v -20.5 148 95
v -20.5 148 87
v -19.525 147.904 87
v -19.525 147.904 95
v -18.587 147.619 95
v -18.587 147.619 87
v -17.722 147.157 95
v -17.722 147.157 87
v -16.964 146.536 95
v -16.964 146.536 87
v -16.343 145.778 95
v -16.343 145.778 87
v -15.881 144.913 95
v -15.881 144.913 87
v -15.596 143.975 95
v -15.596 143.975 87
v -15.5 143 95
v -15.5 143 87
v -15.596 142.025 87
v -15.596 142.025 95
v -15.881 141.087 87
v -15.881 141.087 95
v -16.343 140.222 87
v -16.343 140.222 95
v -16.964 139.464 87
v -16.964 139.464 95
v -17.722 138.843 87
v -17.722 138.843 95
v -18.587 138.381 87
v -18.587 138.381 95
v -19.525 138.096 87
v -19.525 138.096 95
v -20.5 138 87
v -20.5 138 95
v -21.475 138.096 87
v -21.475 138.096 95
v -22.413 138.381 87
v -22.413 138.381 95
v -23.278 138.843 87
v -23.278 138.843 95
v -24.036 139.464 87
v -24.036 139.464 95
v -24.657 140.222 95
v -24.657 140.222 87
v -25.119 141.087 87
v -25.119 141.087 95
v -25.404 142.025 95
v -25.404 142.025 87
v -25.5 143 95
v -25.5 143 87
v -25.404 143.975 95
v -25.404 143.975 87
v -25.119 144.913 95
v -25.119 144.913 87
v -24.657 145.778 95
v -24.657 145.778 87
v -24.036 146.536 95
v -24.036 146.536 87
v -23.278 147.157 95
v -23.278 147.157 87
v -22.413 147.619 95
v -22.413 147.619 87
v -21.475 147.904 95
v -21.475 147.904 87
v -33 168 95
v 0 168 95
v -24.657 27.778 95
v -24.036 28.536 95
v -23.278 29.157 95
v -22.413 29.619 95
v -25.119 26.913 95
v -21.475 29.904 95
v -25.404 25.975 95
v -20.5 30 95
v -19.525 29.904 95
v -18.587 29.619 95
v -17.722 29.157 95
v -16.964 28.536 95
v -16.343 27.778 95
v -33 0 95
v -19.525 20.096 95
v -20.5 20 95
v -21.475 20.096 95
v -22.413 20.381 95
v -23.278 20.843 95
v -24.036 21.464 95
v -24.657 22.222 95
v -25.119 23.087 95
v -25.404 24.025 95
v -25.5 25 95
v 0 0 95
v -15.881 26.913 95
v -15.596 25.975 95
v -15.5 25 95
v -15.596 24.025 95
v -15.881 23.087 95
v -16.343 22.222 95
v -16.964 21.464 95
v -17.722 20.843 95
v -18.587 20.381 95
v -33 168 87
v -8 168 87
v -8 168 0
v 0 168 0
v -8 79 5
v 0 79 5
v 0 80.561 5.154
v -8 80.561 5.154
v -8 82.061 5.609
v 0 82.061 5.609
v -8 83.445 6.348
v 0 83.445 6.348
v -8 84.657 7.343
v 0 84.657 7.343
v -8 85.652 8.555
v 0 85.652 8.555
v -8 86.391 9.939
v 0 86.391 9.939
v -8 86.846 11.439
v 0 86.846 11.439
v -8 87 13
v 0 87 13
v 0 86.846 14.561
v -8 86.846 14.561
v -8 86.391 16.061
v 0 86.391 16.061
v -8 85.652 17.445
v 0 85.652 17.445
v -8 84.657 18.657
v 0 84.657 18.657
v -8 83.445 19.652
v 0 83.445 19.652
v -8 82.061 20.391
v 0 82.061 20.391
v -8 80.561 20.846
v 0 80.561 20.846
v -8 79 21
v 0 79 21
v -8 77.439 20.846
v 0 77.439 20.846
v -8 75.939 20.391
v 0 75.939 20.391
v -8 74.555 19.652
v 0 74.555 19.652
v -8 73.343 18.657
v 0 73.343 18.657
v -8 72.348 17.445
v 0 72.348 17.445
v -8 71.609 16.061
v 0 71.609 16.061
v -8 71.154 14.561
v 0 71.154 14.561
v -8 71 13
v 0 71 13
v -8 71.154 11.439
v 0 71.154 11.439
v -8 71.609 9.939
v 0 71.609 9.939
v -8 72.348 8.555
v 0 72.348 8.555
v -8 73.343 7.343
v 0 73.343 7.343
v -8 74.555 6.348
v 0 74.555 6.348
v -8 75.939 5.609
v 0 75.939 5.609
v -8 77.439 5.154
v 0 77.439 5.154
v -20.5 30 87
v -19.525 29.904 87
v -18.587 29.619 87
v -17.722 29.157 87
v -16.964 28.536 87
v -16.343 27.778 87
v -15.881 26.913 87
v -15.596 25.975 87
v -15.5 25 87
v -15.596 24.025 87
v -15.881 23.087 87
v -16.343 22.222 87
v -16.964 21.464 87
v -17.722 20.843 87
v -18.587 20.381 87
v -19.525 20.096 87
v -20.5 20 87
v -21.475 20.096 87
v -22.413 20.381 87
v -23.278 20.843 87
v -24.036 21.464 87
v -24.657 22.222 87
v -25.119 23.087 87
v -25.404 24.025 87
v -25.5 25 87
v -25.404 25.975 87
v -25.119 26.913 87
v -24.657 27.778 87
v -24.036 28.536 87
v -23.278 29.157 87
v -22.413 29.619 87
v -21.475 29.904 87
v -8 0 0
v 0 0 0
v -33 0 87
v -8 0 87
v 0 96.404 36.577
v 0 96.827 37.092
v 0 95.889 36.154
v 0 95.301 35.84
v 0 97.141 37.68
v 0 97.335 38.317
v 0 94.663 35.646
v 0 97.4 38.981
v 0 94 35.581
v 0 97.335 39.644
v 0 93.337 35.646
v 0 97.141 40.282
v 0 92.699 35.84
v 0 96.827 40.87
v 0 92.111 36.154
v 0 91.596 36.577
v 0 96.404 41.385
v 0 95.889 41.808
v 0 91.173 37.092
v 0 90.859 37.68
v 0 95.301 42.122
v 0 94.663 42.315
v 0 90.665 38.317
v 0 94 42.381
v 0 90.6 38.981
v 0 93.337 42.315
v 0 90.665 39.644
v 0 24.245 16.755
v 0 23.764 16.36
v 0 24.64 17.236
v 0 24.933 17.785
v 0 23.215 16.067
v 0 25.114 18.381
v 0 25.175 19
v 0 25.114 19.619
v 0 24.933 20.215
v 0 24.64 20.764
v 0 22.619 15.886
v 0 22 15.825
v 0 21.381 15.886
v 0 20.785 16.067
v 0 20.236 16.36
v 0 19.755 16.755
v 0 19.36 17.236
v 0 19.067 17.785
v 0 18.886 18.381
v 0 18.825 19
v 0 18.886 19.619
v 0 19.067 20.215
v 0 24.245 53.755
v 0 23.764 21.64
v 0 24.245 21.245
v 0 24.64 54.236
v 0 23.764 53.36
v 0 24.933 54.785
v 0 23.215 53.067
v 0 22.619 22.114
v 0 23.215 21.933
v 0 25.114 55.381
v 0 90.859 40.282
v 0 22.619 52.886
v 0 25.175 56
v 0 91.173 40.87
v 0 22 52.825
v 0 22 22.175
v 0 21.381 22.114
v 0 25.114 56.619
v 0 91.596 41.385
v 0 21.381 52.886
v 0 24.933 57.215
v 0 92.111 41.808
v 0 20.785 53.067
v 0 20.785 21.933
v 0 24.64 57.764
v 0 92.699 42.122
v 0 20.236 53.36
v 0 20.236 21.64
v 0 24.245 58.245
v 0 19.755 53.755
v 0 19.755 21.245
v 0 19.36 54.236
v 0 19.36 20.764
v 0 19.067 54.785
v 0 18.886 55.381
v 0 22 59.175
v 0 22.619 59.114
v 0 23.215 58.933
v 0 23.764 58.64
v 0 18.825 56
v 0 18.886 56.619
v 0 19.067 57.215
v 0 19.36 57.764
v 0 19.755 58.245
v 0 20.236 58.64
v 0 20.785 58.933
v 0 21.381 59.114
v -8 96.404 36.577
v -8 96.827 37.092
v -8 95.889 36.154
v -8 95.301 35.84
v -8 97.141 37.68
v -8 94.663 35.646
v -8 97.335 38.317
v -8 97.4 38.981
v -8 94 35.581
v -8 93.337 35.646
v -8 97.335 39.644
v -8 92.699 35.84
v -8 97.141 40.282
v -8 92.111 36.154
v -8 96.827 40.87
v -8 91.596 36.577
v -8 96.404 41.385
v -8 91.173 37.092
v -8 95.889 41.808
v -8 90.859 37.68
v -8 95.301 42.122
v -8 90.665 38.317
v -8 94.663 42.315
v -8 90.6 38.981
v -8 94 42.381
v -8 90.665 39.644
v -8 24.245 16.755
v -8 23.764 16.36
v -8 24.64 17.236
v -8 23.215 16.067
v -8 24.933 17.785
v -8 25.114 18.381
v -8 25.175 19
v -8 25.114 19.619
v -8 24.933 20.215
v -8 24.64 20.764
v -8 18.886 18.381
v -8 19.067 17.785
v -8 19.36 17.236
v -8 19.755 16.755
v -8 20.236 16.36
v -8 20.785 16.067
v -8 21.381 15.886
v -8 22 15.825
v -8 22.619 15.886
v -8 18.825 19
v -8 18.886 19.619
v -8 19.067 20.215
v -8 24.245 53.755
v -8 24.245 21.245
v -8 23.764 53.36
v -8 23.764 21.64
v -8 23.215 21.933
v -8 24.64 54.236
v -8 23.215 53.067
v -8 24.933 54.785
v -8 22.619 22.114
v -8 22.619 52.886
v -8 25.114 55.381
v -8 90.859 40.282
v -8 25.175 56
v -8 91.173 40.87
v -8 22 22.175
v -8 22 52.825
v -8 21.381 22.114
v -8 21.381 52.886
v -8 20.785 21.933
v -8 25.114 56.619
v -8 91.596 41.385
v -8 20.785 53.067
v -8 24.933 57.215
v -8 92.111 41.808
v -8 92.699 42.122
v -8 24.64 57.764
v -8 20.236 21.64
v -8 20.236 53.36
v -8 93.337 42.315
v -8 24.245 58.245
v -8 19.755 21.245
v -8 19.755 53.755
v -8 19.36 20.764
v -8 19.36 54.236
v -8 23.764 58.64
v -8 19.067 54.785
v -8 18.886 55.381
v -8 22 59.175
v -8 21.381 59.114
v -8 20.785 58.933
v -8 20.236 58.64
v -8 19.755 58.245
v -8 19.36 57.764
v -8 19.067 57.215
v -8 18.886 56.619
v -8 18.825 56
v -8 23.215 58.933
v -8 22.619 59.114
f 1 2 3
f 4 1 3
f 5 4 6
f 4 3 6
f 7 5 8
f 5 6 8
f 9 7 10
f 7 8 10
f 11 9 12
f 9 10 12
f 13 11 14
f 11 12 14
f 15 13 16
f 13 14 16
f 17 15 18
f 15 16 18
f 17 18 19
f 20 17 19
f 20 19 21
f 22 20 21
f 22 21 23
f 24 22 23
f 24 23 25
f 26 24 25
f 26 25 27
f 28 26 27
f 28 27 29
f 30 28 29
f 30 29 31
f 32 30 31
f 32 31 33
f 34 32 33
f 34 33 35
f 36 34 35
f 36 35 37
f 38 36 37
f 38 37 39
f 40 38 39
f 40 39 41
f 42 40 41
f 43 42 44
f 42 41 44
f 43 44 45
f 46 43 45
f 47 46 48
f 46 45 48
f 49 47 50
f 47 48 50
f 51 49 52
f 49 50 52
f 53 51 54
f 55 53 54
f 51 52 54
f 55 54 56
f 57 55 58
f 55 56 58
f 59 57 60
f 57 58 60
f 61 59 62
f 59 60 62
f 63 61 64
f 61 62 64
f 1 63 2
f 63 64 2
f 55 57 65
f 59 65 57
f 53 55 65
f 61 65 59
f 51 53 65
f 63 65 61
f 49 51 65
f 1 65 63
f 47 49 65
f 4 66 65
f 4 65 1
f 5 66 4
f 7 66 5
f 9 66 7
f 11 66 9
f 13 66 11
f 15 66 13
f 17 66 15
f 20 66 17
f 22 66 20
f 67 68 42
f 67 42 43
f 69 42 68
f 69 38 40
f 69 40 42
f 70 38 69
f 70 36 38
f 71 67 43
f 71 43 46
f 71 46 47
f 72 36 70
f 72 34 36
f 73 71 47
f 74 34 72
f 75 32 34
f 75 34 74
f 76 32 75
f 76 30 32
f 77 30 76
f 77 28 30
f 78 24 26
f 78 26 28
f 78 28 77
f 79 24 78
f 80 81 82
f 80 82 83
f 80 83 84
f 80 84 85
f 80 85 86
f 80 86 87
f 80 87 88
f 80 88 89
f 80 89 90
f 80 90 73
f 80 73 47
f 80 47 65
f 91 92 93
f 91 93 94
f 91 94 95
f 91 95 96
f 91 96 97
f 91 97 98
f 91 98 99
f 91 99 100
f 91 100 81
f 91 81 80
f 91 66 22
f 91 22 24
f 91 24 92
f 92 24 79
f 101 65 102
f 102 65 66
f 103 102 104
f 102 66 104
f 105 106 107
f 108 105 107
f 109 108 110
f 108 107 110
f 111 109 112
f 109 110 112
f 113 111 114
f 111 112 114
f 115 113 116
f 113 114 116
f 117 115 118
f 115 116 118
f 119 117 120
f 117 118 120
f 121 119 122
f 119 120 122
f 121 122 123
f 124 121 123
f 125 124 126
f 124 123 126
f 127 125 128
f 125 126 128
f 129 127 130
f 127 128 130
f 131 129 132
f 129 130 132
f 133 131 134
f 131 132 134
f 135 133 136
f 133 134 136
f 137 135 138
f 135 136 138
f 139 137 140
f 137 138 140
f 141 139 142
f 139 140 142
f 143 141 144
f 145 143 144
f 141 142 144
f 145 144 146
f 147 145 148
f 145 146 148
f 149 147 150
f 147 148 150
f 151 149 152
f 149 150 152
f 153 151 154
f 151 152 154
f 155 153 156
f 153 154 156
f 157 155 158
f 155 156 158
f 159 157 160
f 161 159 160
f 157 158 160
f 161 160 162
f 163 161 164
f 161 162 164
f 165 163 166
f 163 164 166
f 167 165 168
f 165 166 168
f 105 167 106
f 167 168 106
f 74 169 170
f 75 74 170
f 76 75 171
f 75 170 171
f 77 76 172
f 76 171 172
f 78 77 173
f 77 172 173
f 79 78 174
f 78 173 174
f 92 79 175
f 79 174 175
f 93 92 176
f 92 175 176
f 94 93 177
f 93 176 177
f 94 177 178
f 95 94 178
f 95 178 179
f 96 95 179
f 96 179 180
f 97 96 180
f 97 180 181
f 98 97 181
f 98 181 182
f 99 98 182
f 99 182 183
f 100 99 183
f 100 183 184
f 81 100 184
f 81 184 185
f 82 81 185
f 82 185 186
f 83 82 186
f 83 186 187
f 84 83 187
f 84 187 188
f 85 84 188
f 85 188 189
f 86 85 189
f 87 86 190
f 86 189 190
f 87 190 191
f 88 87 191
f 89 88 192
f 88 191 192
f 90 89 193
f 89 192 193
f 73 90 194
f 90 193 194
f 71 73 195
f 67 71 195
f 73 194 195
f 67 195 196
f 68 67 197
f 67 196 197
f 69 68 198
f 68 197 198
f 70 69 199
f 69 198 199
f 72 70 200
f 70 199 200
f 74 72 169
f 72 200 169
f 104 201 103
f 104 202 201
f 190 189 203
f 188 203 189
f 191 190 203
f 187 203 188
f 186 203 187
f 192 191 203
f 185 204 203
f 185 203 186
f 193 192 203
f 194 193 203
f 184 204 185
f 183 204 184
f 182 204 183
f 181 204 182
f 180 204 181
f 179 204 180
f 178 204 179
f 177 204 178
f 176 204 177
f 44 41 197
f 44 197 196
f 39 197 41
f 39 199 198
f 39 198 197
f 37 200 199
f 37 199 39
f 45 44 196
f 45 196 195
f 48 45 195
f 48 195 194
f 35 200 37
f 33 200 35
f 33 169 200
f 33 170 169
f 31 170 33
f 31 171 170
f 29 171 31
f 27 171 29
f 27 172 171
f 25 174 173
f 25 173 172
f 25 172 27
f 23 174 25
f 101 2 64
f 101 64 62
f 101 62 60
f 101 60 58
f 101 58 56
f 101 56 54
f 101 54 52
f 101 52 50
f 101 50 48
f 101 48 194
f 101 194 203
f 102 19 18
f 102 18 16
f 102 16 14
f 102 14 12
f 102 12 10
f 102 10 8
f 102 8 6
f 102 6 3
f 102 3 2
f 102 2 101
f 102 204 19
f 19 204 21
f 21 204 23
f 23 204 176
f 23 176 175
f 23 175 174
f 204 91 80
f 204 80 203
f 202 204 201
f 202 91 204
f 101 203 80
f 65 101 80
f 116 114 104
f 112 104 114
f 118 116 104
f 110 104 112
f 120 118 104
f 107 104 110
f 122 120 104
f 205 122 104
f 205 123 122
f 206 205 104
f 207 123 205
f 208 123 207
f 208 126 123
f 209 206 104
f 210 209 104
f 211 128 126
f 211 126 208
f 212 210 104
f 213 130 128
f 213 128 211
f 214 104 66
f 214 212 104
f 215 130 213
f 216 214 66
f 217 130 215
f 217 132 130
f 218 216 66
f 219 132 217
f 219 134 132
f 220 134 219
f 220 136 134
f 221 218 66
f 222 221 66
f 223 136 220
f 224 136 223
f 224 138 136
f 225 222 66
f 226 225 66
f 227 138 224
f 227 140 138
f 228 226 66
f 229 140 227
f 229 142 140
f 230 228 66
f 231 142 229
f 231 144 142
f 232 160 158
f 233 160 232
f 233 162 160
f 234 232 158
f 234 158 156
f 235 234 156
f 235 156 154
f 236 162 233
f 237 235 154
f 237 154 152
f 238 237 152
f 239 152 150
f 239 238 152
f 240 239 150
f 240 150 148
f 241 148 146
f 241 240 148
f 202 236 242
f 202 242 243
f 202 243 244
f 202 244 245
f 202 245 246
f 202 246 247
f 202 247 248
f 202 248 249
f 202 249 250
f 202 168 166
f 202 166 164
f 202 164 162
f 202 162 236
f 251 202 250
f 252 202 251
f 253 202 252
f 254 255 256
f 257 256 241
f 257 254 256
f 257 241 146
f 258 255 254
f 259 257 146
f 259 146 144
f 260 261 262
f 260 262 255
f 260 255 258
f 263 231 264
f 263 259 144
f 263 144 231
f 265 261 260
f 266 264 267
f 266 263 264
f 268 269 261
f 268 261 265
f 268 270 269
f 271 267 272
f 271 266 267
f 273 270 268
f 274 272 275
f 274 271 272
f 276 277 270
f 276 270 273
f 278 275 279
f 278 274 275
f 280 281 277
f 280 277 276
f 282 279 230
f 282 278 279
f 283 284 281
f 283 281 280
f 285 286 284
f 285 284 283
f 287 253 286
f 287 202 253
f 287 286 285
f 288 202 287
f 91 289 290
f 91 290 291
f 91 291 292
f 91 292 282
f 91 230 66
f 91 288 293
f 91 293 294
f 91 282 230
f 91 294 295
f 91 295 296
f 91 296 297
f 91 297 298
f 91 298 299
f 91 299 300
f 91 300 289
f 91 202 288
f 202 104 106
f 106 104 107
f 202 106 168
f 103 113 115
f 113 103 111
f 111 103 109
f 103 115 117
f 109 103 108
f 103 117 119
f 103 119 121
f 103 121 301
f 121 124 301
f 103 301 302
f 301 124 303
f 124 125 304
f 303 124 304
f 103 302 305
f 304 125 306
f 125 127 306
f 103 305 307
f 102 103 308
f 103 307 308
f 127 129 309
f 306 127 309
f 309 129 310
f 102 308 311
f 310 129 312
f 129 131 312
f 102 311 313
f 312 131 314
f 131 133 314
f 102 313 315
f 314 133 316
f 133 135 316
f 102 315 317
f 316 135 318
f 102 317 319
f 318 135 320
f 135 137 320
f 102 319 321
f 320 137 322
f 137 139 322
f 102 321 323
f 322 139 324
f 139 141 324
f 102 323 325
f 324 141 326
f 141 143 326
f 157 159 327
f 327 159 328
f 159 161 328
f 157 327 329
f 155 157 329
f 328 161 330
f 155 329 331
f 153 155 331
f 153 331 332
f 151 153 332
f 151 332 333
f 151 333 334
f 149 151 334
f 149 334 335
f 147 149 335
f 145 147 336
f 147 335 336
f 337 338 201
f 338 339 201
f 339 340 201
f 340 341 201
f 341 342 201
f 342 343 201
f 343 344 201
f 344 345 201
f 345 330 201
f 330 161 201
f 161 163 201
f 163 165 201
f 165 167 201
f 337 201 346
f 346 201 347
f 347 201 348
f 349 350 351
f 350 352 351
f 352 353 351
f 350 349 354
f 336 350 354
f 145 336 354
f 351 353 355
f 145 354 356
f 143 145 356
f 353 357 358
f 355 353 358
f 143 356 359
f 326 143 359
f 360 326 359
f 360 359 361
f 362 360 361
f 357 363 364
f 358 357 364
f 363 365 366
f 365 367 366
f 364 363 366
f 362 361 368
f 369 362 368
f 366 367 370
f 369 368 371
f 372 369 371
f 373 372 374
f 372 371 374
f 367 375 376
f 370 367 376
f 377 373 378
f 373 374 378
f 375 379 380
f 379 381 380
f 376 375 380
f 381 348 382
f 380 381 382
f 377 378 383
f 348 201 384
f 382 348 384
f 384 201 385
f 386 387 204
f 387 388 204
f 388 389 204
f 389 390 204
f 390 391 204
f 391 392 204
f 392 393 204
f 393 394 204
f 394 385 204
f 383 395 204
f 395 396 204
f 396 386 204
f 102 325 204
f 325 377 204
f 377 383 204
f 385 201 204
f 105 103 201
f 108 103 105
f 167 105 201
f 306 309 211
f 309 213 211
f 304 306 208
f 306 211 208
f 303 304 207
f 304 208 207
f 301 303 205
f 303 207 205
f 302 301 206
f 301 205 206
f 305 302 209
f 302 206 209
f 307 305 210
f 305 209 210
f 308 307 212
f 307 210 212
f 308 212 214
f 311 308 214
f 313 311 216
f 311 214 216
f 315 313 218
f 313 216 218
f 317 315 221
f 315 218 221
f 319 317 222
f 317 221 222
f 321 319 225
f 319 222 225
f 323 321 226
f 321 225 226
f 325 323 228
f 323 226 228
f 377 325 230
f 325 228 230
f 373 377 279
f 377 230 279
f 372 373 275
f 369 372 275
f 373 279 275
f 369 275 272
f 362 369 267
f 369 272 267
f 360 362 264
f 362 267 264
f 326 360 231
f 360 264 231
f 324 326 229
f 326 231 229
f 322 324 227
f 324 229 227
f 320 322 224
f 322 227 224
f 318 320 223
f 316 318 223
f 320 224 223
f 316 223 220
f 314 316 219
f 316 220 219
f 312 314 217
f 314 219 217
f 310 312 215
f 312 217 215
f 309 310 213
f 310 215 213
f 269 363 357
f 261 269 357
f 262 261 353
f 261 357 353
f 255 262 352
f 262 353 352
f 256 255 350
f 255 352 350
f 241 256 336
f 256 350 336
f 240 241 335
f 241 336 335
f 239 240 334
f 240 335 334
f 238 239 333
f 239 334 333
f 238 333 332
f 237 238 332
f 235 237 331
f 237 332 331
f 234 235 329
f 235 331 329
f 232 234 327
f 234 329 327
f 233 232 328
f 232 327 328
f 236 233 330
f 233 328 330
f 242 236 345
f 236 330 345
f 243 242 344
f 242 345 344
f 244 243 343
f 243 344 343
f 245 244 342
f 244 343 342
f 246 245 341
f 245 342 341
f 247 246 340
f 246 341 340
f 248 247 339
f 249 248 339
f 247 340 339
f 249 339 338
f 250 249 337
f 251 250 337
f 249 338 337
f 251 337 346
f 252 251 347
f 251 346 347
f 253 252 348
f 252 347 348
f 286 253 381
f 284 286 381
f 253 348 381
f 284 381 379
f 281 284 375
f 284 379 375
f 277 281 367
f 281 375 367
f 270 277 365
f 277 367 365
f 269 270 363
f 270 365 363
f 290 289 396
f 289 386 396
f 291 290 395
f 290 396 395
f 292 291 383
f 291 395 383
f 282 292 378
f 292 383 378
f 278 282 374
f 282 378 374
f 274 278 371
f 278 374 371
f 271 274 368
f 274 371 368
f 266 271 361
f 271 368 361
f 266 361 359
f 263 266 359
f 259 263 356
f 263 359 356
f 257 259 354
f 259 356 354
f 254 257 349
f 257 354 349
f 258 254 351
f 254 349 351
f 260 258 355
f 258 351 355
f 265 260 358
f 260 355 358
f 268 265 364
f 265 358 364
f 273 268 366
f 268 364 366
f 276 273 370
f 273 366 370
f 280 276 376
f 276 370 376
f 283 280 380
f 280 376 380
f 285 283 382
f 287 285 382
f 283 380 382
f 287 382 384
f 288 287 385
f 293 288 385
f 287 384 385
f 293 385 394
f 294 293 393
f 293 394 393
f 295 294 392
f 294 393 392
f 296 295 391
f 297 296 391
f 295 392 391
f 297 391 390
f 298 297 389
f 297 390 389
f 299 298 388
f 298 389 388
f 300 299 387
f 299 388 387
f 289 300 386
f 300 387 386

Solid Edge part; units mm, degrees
sketch "Sketch1" plane through (0, 0, 0) normal (1, 0, 0) x (0, 1, 0)
  line L0 (0, 0) -> (168, 0)
  line L1 (168, 95) -> (168, 0)
  line L2 (168, 95) -> (0, 95)
  line L3 (0, 95) -> (0, 0)
  dimension "D1" = 168
  dimension "D2" = 95
extrude "Protrusion1" add sketch "Sketch1" against normal blind 8
hole "Hole_1" at (0, 79, 13) direction (-1, 0, 0) diameter 16 end through all
sketch "Sketch2" plane through (0, 76.5, 47.5) normal (1, 0, 0) x (0, 1, 0)
  circle A0 centre (17.5, -8.5192) radius 3
extrude "Cutout1" cut sketch "Sketch2" against normal blind 50.8
hole "Hole_2" at (0, 94, 38.9808) direction (-1, 0, 0) diameter 6.8 end through all
sketch "Sketch3" plane through (-8, 84, 47.5) normal (-1, 0, 0) x (0, 1, 0)
  line L0 (-84, -39.5) -> (84, -39.5)
  line L1 (84, -39.5) -> (84, -47.5)
  line L2 (84, -47.5) -> (-84, -47.5)
  line L3 (-84, -47.5) -> (-84, -39.5)
  dimension "D1" = 8
extrude "ExtrudedProtrusion_2" add sketch "Sketch3" along normal blind 25
hole "Hole_3" at (-20.5, 143, 87) direction (0, 0, 1) diameter 10 end up to next
hole "Hole1" at (-20.5, 25, 87) direction (0, 0, 1) diameter 10 end up to next
hole "Hole_7" at (-8, 22, 56) direction (1, 0, 0) diameter 6.35 end up to next
hole "Hole2" at (-8, 22, 19) direction (1, 0, 0) diameter 6.35 end up to next
properties part number "88866"
